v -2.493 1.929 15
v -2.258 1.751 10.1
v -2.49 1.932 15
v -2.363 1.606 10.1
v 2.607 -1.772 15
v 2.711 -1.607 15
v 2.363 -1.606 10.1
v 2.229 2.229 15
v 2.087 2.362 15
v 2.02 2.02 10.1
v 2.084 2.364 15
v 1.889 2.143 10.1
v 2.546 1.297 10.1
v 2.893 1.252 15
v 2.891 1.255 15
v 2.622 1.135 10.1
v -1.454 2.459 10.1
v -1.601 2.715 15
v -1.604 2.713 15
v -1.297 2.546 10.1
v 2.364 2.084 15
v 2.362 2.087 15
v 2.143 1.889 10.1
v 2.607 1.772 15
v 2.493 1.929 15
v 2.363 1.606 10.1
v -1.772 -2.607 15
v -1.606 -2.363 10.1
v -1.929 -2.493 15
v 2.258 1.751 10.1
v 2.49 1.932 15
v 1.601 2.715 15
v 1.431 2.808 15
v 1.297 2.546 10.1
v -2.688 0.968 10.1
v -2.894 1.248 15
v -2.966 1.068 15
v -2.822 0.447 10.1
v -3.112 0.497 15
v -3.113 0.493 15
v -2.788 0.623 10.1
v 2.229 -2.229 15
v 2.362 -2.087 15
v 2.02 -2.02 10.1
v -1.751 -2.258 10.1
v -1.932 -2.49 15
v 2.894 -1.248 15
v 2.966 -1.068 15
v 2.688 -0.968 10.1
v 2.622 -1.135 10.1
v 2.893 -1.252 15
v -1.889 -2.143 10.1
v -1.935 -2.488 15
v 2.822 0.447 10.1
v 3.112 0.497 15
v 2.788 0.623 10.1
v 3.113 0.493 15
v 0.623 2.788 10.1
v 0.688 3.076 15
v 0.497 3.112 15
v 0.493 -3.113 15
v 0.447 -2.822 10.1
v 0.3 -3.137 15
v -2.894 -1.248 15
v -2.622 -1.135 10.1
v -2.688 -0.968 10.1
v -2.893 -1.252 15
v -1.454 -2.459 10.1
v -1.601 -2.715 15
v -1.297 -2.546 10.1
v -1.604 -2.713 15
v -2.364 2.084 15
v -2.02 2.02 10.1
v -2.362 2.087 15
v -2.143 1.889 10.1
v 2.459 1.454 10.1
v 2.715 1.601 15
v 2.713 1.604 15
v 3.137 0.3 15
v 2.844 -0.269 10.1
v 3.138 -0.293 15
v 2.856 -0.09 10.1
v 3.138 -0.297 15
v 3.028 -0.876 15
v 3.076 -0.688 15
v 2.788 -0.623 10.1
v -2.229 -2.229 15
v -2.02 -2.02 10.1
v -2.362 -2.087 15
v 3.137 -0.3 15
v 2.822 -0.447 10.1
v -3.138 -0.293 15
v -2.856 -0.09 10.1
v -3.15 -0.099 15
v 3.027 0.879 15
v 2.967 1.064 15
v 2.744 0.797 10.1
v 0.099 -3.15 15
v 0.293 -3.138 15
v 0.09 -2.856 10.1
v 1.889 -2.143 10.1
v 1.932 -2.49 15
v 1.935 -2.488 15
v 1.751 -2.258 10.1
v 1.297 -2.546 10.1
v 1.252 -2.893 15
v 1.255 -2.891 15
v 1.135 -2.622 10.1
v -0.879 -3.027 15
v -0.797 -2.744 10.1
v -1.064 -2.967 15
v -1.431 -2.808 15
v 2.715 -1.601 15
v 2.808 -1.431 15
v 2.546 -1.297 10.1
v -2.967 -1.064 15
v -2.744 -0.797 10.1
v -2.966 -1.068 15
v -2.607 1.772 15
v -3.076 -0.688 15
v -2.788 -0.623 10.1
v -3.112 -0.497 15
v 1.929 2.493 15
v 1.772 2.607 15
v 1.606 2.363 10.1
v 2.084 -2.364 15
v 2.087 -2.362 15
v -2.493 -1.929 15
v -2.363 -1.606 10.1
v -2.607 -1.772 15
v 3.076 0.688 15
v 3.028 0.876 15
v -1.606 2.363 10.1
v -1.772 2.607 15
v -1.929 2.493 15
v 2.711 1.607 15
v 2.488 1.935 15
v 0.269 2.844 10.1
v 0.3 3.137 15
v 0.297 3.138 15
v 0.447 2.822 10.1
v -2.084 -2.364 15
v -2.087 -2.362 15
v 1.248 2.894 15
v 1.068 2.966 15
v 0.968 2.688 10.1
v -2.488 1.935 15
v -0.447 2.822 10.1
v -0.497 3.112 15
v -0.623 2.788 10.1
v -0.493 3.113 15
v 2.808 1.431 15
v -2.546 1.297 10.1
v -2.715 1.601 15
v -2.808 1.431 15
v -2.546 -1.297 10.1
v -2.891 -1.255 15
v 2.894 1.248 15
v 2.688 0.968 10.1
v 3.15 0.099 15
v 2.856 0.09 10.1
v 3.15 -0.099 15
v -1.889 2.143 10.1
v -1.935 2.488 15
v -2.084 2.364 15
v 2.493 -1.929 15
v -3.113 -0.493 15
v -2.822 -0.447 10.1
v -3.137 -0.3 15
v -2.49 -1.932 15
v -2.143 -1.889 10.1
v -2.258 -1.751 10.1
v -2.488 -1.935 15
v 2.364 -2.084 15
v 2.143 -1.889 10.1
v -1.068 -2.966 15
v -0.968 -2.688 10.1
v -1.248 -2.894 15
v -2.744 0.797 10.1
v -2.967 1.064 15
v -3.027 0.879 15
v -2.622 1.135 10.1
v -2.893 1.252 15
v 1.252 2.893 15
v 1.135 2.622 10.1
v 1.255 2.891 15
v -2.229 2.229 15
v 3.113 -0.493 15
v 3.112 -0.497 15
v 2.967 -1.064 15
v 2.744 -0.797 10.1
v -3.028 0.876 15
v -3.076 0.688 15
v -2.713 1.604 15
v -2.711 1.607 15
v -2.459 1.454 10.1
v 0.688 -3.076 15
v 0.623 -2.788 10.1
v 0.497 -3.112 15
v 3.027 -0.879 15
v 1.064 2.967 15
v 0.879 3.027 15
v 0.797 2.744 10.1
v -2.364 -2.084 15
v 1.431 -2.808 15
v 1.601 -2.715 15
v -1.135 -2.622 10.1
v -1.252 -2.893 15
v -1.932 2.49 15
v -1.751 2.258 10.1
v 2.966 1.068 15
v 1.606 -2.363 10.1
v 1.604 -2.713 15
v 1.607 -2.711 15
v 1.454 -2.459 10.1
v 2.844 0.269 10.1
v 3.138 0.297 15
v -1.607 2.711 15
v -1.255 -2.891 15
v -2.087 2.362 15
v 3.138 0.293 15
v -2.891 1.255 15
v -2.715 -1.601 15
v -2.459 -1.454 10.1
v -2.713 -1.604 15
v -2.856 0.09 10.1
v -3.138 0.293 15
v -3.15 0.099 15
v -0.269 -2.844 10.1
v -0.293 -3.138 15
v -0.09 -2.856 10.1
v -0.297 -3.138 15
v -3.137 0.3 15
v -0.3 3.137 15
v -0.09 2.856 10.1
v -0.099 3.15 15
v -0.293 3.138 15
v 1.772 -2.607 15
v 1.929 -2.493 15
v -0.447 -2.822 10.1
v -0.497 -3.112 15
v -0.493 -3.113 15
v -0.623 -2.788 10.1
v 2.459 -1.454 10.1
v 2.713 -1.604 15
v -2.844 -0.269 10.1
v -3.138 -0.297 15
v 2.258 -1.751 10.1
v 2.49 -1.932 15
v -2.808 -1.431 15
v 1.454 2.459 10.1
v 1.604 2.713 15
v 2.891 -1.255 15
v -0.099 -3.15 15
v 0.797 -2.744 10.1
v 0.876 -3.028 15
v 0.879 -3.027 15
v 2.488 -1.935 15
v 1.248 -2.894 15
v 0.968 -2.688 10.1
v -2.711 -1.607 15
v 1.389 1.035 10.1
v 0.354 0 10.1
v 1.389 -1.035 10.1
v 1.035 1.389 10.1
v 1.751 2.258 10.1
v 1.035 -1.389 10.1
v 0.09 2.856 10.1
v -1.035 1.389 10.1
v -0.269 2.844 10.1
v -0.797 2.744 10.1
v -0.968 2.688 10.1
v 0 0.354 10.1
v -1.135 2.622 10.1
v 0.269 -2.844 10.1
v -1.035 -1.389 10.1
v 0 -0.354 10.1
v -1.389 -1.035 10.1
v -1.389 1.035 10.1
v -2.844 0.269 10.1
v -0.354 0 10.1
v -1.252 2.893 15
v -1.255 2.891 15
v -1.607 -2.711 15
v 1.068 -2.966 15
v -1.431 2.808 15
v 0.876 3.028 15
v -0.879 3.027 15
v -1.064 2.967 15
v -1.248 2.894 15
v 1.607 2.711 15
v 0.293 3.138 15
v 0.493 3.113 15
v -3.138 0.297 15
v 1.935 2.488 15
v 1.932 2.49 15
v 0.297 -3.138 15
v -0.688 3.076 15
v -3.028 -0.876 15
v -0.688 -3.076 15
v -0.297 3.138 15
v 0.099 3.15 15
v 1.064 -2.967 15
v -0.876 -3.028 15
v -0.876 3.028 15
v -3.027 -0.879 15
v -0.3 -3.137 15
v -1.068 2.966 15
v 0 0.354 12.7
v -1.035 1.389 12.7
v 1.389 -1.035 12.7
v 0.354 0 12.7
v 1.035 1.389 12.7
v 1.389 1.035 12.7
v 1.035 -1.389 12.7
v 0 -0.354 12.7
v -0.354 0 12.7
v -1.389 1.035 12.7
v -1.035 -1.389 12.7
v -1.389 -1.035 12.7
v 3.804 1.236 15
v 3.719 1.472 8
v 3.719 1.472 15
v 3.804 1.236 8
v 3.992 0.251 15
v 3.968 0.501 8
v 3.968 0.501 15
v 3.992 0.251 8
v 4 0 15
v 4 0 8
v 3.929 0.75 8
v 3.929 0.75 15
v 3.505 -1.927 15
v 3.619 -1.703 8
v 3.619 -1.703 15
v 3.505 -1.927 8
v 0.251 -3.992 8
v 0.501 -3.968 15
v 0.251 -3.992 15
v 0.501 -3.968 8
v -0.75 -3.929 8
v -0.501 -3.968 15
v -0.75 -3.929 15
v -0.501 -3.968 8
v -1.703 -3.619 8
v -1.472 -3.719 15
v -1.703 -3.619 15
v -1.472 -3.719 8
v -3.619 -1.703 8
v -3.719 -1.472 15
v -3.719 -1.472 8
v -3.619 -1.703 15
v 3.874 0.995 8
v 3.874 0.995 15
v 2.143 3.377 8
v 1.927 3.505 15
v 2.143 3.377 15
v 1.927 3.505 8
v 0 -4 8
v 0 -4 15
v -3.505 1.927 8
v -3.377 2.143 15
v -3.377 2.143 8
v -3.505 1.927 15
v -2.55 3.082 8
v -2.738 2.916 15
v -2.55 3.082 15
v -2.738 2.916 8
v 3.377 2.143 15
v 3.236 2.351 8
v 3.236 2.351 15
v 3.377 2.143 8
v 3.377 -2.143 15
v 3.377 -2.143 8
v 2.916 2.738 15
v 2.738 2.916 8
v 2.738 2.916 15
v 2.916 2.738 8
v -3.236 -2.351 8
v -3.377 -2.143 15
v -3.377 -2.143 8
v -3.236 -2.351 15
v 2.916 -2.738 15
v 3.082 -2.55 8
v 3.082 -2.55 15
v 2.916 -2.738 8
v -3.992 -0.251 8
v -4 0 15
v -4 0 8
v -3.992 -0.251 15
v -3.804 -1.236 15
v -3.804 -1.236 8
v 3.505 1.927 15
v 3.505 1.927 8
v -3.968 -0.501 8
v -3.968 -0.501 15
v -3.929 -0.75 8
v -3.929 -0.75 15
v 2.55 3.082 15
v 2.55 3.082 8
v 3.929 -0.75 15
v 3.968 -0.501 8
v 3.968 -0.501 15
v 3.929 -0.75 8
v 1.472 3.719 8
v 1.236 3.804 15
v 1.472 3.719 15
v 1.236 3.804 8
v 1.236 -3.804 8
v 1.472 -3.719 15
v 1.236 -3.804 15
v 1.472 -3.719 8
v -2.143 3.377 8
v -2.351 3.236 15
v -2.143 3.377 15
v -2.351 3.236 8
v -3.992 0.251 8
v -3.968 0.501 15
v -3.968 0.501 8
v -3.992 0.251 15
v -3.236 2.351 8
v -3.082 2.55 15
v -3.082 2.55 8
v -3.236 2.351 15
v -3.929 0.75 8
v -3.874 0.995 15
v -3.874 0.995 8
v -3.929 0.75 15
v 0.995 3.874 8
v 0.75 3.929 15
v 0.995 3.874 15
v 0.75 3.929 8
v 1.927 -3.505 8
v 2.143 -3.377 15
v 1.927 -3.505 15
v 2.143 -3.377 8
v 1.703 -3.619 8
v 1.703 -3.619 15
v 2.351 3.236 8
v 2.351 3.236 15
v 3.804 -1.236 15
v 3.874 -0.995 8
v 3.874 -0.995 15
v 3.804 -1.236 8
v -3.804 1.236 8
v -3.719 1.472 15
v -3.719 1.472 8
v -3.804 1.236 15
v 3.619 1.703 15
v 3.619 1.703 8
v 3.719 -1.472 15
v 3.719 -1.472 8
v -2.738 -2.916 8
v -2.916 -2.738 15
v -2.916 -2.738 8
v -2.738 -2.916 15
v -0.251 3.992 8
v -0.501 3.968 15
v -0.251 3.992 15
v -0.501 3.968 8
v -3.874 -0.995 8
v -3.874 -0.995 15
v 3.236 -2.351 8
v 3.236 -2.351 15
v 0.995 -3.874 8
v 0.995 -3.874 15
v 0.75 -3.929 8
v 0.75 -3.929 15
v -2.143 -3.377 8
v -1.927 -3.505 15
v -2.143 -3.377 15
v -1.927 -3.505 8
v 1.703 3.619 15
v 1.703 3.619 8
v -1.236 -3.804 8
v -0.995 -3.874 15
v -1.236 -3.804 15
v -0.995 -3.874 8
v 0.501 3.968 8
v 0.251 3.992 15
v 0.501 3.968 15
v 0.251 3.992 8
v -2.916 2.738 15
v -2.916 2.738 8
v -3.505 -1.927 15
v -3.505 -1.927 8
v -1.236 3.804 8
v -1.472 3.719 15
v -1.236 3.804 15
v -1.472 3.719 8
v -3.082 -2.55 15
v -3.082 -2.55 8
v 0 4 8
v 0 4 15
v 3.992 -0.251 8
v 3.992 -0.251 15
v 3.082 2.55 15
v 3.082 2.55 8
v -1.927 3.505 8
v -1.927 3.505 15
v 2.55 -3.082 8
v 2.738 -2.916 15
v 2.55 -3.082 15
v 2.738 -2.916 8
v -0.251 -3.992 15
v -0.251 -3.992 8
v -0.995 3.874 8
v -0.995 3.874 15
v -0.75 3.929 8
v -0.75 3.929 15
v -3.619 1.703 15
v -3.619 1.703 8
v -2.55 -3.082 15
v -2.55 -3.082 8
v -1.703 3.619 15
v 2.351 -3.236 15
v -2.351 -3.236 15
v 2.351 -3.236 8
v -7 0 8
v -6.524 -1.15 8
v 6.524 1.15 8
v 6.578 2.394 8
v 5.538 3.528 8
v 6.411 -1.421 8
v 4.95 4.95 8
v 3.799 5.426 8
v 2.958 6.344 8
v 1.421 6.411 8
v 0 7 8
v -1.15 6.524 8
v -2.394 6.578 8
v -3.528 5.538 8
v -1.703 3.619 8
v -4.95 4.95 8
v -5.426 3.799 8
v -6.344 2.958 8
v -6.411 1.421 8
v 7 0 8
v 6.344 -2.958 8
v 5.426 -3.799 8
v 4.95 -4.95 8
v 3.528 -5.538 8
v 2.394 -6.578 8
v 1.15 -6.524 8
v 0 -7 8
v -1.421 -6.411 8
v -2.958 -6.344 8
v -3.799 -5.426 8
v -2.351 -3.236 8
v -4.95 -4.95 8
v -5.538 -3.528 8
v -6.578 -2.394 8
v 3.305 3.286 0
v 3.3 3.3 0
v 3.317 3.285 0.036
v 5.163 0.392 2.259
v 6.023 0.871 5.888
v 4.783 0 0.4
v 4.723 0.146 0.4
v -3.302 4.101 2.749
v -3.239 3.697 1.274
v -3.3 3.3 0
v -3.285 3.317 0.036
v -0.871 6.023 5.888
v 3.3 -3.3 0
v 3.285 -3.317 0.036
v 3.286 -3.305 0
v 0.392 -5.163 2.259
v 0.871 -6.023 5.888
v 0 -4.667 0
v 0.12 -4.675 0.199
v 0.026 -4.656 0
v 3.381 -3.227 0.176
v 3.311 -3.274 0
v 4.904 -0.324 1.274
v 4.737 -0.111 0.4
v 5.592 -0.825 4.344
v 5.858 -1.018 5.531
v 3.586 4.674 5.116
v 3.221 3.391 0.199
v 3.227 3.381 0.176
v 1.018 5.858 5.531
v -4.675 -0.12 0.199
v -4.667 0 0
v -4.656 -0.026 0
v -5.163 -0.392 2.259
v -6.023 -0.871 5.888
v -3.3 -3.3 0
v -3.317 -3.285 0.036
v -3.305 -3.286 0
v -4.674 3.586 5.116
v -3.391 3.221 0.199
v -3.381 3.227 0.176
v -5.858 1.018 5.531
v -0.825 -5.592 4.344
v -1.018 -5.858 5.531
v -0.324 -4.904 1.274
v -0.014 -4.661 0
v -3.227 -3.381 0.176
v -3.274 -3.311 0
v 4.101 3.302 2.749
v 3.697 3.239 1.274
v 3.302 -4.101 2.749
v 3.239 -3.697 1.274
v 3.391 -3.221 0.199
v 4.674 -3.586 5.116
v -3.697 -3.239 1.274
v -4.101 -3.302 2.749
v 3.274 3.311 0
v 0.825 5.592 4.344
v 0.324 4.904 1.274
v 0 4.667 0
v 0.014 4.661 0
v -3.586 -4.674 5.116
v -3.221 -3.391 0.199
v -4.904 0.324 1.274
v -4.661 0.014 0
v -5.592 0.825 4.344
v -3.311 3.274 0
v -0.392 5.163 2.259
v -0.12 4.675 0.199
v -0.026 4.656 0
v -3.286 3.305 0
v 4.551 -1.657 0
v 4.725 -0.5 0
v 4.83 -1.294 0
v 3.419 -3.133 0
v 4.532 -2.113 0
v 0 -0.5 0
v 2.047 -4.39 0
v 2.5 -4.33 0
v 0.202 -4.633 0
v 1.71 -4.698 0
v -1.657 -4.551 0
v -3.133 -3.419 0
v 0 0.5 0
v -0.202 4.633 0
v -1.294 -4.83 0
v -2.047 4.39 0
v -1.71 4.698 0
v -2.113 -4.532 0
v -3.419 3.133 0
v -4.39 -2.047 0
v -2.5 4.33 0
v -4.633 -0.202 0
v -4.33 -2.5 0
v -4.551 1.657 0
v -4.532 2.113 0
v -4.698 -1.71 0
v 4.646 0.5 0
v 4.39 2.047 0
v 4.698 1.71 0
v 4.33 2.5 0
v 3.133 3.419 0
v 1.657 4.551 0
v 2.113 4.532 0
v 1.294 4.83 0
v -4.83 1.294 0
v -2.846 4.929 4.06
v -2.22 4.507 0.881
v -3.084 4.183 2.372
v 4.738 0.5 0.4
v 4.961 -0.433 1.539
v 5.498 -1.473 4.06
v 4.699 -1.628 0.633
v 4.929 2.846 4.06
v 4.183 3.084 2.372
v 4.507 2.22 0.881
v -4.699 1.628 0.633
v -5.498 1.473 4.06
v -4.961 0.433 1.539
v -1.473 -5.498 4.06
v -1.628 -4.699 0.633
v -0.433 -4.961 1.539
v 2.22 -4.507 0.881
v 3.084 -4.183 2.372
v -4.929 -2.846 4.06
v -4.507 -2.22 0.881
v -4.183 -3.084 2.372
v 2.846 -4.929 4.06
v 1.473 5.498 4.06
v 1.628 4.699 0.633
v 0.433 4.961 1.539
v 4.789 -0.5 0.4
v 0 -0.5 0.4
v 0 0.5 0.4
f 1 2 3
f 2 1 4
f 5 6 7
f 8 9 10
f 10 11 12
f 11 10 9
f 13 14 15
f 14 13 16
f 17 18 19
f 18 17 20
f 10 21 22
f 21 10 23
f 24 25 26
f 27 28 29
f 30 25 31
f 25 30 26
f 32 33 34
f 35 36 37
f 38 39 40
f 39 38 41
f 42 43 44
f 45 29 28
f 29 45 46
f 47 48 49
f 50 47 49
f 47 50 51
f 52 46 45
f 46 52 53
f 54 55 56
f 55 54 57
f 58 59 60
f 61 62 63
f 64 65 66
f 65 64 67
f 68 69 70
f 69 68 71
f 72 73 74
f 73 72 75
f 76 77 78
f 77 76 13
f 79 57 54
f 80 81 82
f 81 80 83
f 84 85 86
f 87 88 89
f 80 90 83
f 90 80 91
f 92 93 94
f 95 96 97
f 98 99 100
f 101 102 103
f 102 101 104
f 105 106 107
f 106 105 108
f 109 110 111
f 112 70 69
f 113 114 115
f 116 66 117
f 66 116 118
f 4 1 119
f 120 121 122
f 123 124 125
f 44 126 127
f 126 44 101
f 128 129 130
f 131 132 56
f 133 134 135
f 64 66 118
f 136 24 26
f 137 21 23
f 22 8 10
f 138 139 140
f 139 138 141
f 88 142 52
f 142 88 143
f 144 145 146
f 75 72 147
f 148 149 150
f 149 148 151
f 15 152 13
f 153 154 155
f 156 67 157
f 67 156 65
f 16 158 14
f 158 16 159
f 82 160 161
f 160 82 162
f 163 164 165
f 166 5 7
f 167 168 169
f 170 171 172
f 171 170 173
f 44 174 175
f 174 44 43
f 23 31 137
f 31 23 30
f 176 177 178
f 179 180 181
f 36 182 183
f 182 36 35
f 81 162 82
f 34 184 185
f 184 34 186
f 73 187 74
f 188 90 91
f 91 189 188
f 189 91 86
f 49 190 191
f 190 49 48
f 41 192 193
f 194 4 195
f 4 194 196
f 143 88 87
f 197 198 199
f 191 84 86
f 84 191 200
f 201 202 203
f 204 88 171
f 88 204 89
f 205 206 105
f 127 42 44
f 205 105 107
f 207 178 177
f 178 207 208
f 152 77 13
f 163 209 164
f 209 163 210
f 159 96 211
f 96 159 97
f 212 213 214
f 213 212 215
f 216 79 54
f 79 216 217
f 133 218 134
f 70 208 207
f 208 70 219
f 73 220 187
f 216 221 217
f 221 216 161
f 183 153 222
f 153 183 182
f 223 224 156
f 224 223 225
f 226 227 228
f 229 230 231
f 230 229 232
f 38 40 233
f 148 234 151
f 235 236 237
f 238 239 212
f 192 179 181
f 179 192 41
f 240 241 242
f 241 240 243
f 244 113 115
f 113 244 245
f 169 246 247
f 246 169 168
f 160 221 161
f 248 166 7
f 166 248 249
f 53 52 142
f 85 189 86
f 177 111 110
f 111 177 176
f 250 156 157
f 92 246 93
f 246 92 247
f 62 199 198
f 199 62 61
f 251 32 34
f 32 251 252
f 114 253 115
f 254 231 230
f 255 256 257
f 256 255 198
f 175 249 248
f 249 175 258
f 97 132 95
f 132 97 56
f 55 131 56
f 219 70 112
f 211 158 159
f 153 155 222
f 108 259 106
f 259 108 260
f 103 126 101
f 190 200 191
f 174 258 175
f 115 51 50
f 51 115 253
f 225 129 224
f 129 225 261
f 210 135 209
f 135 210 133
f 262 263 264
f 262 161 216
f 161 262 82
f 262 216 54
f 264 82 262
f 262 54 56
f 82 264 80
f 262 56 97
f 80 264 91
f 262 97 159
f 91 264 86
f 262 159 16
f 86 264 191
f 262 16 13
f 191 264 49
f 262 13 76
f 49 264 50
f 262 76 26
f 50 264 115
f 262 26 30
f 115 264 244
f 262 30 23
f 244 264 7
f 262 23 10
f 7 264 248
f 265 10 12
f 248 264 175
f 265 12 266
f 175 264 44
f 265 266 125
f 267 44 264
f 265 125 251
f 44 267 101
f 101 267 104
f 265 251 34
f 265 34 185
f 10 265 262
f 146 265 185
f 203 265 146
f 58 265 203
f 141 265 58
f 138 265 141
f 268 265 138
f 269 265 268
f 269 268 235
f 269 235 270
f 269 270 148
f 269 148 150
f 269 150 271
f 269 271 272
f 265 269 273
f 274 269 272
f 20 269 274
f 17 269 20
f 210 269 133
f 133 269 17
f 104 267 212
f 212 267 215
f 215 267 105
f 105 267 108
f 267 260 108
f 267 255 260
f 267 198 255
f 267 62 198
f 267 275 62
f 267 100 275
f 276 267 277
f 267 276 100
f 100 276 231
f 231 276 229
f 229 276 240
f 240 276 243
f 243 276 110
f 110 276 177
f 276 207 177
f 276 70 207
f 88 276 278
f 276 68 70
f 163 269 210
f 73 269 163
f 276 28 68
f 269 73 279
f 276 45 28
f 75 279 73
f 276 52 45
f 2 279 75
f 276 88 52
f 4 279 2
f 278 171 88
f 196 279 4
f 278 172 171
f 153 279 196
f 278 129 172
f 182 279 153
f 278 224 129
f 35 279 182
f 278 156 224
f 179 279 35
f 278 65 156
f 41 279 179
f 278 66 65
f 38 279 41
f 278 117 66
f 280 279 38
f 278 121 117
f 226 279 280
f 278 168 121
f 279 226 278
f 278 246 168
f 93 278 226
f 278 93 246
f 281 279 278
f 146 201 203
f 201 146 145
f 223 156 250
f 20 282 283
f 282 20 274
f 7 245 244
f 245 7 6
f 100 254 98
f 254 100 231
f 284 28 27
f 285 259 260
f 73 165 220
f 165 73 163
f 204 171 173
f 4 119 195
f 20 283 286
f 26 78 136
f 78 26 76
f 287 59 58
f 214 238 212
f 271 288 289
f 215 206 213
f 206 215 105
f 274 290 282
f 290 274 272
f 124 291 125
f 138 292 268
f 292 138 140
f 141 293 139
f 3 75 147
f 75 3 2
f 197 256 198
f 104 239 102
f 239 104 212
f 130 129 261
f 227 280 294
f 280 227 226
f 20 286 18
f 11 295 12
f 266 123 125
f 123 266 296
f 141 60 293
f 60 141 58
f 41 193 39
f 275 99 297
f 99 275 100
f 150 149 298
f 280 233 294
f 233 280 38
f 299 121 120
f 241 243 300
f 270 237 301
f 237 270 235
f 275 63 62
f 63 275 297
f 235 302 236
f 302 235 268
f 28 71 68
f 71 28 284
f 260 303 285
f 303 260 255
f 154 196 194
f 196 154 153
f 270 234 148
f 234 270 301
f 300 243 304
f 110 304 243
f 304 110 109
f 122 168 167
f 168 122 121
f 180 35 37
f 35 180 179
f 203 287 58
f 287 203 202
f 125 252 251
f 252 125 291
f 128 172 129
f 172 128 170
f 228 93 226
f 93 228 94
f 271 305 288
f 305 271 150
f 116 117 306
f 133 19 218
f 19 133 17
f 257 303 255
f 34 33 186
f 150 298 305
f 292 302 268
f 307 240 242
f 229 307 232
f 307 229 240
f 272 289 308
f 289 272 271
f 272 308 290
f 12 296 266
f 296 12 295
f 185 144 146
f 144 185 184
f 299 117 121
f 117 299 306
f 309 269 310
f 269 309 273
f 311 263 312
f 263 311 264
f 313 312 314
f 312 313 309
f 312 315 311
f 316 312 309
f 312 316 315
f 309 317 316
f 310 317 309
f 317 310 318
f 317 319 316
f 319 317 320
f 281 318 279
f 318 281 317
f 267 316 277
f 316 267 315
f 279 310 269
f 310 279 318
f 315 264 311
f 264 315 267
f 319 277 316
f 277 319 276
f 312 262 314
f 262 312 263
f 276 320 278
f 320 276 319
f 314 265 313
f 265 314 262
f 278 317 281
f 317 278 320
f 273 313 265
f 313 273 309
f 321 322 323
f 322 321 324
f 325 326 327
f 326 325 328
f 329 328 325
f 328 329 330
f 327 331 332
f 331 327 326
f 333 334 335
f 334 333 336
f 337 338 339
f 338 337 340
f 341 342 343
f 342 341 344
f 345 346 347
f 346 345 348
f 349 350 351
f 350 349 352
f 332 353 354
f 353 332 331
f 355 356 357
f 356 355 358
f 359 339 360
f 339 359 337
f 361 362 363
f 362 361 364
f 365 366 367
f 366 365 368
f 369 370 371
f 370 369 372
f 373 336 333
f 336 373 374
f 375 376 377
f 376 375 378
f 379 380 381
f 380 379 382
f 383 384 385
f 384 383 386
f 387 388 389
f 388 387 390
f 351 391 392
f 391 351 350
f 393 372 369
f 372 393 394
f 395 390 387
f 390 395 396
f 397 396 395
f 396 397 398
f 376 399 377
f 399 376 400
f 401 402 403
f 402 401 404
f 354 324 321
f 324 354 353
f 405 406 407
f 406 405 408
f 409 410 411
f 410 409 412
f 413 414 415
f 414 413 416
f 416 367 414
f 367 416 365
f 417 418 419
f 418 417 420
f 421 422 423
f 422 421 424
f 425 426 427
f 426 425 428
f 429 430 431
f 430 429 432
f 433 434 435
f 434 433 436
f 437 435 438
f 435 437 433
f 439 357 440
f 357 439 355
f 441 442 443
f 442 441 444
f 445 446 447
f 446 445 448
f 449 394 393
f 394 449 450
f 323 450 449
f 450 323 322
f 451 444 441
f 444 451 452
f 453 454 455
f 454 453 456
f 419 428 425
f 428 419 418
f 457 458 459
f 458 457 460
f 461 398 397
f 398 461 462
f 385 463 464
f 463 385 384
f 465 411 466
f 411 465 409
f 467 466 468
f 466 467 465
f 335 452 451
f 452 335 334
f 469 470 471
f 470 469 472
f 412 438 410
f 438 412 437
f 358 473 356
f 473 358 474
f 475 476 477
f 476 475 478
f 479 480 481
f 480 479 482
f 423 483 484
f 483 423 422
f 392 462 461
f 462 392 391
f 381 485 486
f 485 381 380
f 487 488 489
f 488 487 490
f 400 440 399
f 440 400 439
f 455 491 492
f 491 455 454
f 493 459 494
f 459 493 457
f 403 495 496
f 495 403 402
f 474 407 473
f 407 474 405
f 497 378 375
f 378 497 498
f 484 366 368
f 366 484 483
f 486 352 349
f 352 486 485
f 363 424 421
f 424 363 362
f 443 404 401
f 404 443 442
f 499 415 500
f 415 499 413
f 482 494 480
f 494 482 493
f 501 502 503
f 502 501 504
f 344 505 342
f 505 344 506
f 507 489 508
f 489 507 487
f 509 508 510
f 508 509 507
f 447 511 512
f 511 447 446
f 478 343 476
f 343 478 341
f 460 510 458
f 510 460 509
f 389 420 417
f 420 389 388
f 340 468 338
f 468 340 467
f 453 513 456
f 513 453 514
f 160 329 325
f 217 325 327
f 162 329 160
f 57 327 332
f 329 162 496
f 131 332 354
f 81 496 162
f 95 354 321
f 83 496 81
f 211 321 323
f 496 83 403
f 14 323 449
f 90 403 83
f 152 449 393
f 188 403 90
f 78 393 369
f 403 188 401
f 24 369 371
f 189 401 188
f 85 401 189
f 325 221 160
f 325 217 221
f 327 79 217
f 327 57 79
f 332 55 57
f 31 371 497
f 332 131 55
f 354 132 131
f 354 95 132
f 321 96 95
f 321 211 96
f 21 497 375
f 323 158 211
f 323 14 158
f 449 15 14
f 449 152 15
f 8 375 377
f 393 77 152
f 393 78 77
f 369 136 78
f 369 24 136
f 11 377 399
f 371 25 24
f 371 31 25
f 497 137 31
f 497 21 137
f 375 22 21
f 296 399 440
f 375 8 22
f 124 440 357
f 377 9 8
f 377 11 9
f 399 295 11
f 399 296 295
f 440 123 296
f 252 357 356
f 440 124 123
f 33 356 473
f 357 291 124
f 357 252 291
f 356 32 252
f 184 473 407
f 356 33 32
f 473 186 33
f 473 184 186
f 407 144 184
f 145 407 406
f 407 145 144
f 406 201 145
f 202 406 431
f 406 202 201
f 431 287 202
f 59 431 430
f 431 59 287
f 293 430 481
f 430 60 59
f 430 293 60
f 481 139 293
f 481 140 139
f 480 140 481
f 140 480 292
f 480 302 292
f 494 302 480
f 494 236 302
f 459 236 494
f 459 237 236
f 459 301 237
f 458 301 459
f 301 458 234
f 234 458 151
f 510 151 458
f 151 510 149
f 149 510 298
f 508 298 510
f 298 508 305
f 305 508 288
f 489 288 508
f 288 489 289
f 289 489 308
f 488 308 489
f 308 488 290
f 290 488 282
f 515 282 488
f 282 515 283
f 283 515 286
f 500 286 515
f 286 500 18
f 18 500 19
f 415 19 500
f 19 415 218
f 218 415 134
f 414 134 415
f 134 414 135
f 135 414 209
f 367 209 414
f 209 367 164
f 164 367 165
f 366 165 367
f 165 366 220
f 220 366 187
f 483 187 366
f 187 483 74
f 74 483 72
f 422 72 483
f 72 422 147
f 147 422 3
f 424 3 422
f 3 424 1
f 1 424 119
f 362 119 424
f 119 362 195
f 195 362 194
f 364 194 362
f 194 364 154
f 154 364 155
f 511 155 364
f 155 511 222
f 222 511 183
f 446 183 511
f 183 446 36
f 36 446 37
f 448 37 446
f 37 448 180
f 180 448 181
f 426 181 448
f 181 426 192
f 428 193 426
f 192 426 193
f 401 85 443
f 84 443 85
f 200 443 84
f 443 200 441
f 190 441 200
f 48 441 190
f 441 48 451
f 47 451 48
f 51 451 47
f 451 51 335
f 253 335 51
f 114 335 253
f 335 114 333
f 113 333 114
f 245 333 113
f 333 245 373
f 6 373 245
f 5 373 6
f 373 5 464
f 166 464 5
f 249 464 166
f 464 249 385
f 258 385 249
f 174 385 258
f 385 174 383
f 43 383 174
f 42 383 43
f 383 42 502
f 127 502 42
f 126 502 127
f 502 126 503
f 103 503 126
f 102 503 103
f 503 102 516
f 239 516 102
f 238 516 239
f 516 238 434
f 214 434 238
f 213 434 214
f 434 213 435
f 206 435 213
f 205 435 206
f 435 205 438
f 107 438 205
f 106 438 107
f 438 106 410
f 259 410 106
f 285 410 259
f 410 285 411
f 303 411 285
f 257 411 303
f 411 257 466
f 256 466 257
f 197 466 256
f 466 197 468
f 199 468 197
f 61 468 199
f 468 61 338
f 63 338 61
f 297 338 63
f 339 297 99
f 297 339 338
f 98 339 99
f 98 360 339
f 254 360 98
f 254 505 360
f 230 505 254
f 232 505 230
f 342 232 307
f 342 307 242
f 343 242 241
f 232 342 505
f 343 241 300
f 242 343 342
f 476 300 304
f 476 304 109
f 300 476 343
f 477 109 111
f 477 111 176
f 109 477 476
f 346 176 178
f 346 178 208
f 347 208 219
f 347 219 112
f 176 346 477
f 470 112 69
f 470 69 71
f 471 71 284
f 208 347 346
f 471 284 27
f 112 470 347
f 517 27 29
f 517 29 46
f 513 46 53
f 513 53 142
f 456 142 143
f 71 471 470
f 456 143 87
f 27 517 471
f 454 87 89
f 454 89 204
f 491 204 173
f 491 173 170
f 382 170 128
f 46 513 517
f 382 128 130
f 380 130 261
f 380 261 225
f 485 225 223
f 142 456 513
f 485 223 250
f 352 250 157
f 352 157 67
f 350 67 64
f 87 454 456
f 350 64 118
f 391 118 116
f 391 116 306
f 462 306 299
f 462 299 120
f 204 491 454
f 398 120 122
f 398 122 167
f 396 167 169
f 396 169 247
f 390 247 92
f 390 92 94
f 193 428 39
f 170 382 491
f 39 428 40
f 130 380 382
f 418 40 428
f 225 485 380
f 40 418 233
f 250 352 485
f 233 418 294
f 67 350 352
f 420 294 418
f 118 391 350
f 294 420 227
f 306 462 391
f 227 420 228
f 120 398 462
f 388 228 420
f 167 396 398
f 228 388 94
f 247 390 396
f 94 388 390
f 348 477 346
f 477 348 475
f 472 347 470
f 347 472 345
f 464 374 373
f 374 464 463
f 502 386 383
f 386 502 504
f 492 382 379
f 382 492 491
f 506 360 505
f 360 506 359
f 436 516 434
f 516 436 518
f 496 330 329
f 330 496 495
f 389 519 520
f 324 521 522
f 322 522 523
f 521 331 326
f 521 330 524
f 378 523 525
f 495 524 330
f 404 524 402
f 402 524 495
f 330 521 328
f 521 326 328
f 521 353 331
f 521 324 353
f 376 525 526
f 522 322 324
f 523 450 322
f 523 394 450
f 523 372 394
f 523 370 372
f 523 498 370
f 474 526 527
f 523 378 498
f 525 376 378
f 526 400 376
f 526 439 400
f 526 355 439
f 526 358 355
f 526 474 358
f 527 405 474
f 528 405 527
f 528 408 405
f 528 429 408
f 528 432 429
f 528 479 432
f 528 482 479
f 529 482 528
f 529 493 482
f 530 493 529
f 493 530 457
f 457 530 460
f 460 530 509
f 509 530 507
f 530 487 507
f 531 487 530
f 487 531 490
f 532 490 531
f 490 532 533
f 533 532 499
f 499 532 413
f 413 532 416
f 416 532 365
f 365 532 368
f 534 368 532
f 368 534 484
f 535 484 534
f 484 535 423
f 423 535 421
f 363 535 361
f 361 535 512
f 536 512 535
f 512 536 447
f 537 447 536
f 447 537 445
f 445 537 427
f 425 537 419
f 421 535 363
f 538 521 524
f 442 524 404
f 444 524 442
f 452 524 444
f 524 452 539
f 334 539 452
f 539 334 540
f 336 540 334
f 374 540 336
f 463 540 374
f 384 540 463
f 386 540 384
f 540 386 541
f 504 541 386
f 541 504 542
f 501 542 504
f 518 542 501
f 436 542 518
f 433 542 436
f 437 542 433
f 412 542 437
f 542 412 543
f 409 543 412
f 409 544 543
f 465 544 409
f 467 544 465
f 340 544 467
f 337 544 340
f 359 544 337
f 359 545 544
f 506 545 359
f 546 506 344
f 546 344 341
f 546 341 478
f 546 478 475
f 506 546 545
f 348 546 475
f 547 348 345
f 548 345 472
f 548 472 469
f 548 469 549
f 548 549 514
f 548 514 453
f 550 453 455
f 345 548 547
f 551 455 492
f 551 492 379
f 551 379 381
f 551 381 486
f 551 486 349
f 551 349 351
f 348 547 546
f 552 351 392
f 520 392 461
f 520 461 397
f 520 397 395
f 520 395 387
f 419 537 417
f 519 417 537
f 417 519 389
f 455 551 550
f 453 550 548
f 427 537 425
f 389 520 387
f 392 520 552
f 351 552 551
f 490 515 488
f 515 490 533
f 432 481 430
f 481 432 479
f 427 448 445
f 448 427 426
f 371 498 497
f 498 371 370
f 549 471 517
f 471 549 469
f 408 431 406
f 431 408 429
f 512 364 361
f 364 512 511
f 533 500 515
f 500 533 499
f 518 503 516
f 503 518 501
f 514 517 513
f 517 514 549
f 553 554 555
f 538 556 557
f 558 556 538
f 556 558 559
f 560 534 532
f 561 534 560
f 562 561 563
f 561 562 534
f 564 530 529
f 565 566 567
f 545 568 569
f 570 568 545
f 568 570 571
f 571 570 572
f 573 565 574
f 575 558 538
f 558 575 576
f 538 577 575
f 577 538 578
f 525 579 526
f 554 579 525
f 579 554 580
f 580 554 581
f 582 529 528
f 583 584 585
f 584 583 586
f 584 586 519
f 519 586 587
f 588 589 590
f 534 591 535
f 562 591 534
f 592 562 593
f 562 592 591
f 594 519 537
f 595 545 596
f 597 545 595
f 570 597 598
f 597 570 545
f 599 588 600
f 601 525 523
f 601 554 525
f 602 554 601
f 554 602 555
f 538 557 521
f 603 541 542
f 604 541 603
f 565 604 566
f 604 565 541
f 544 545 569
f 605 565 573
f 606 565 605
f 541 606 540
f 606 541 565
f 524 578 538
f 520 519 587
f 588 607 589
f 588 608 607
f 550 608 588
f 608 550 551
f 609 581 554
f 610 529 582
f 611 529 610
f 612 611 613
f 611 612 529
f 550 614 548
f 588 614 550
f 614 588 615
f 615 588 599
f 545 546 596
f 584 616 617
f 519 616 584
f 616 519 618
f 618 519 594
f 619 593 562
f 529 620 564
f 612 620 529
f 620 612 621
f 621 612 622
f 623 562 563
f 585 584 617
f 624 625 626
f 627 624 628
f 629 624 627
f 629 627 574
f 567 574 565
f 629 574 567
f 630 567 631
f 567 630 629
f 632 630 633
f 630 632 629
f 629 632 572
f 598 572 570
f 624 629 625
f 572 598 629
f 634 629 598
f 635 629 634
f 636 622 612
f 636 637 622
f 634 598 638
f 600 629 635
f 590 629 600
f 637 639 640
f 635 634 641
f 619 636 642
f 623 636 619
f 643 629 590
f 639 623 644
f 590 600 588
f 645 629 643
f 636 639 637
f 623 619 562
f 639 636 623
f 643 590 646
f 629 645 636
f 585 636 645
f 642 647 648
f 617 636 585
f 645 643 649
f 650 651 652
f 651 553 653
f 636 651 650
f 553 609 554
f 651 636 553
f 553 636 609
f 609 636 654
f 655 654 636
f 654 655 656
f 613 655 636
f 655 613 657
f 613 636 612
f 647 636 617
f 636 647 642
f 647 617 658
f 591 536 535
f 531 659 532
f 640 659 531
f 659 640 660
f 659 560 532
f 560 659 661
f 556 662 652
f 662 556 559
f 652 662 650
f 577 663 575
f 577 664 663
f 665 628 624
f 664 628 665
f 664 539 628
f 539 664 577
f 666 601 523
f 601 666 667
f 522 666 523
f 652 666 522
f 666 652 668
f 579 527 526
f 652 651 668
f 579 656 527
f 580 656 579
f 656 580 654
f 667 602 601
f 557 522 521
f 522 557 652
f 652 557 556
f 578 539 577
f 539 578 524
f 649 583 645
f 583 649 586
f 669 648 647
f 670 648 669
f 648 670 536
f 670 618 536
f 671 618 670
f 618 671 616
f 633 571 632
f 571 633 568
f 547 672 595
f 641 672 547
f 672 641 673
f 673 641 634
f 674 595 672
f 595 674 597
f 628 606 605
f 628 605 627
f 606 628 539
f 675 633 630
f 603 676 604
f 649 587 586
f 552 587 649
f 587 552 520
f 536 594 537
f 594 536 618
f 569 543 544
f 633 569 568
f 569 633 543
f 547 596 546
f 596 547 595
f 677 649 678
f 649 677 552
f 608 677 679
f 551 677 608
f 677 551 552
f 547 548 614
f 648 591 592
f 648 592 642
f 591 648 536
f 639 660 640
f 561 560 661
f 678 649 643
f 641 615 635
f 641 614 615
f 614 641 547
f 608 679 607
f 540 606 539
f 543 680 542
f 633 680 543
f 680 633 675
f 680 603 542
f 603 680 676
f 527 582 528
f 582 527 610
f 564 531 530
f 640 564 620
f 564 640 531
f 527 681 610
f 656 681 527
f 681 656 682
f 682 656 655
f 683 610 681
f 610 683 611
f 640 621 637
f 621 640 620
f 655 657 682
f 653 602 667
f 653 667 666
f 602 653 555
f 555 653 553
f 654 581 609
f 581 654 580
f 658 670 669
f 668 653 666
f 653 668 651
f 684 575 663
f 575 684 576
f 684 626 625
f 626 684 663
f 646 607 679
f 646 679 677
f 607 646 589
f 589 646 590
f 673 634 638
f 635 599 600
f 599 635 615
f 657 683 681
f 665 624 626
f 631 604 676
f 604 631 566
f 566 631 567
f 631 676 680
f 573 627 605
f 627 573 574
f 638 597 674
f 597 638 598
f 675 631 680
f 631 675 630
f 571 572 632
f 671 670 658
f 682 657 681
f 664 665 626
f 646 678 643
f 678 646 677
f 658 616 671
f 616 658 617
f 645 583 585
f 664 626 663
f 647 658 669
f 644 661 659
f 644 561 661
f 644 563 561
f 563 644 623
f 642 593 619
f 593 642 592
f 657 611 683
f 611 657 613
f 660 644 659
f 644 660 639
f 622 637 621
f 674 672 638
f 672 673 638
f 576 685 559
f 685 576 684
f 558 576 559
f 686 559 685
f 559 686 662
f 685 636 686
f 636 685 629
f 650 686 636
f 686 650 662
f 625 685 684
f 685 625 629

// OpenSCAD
// This is only a knob for the prototypes

pot_height=5;
pot_diameter=6;
pot_cut_depth=1.5;
stem_diameter=8;
stem_height=7;

head_height=8;
head_diameter=14;
head_fn=8;

cross_length = pot_diameter/1.75;
cross_thickness = 0.5;
$fn=100;
module pot() {
    difference() {
        cylinder(pot_height, pot_diameter/2.1, pot_diameter/1.9);
        translate([-cross_thickness/2, -cross_length/2, -0.1]) cube([cross_thickness, cross_length,pot_height/2+2*0.1]);
        rotate([0,0,90])translate([-cross_thickness/2, -cross_length/2, -0.1]) cube([cross_thickness, cross_length,pot_height/2+2*0.1]);
    }
}

module stem() {
    difference() {
        cylinder(stem_height, stem_diameter/2,stem_diameter/2);
        rotate([0,0,45]) translate([0,0,stem_height-pot_height+0.1]) pot();
    }
}

module design_head() {
    translate([0, -0.5, -0.1]) cube([head_diameter/2, 1, 0.5]);
}

module head() {
    difference() { 
    union() {
        cylinder(head_height, head_diameter/3, head_diameter/2, $fn=head_fn);
        rotate([0,0,20]) cylinder(head_height, head_diameter/2.8, head_diameter/2, $fn=head_fn);
        rotate([0,0,30]) cylinder(head_height, head_diameter/2.8, head_diameter/2.2, $fn=head_fn);
    }
    design_head();
}
}

module full() {
    translate([0,0,head_height]) stem();
    head();
}

full();
